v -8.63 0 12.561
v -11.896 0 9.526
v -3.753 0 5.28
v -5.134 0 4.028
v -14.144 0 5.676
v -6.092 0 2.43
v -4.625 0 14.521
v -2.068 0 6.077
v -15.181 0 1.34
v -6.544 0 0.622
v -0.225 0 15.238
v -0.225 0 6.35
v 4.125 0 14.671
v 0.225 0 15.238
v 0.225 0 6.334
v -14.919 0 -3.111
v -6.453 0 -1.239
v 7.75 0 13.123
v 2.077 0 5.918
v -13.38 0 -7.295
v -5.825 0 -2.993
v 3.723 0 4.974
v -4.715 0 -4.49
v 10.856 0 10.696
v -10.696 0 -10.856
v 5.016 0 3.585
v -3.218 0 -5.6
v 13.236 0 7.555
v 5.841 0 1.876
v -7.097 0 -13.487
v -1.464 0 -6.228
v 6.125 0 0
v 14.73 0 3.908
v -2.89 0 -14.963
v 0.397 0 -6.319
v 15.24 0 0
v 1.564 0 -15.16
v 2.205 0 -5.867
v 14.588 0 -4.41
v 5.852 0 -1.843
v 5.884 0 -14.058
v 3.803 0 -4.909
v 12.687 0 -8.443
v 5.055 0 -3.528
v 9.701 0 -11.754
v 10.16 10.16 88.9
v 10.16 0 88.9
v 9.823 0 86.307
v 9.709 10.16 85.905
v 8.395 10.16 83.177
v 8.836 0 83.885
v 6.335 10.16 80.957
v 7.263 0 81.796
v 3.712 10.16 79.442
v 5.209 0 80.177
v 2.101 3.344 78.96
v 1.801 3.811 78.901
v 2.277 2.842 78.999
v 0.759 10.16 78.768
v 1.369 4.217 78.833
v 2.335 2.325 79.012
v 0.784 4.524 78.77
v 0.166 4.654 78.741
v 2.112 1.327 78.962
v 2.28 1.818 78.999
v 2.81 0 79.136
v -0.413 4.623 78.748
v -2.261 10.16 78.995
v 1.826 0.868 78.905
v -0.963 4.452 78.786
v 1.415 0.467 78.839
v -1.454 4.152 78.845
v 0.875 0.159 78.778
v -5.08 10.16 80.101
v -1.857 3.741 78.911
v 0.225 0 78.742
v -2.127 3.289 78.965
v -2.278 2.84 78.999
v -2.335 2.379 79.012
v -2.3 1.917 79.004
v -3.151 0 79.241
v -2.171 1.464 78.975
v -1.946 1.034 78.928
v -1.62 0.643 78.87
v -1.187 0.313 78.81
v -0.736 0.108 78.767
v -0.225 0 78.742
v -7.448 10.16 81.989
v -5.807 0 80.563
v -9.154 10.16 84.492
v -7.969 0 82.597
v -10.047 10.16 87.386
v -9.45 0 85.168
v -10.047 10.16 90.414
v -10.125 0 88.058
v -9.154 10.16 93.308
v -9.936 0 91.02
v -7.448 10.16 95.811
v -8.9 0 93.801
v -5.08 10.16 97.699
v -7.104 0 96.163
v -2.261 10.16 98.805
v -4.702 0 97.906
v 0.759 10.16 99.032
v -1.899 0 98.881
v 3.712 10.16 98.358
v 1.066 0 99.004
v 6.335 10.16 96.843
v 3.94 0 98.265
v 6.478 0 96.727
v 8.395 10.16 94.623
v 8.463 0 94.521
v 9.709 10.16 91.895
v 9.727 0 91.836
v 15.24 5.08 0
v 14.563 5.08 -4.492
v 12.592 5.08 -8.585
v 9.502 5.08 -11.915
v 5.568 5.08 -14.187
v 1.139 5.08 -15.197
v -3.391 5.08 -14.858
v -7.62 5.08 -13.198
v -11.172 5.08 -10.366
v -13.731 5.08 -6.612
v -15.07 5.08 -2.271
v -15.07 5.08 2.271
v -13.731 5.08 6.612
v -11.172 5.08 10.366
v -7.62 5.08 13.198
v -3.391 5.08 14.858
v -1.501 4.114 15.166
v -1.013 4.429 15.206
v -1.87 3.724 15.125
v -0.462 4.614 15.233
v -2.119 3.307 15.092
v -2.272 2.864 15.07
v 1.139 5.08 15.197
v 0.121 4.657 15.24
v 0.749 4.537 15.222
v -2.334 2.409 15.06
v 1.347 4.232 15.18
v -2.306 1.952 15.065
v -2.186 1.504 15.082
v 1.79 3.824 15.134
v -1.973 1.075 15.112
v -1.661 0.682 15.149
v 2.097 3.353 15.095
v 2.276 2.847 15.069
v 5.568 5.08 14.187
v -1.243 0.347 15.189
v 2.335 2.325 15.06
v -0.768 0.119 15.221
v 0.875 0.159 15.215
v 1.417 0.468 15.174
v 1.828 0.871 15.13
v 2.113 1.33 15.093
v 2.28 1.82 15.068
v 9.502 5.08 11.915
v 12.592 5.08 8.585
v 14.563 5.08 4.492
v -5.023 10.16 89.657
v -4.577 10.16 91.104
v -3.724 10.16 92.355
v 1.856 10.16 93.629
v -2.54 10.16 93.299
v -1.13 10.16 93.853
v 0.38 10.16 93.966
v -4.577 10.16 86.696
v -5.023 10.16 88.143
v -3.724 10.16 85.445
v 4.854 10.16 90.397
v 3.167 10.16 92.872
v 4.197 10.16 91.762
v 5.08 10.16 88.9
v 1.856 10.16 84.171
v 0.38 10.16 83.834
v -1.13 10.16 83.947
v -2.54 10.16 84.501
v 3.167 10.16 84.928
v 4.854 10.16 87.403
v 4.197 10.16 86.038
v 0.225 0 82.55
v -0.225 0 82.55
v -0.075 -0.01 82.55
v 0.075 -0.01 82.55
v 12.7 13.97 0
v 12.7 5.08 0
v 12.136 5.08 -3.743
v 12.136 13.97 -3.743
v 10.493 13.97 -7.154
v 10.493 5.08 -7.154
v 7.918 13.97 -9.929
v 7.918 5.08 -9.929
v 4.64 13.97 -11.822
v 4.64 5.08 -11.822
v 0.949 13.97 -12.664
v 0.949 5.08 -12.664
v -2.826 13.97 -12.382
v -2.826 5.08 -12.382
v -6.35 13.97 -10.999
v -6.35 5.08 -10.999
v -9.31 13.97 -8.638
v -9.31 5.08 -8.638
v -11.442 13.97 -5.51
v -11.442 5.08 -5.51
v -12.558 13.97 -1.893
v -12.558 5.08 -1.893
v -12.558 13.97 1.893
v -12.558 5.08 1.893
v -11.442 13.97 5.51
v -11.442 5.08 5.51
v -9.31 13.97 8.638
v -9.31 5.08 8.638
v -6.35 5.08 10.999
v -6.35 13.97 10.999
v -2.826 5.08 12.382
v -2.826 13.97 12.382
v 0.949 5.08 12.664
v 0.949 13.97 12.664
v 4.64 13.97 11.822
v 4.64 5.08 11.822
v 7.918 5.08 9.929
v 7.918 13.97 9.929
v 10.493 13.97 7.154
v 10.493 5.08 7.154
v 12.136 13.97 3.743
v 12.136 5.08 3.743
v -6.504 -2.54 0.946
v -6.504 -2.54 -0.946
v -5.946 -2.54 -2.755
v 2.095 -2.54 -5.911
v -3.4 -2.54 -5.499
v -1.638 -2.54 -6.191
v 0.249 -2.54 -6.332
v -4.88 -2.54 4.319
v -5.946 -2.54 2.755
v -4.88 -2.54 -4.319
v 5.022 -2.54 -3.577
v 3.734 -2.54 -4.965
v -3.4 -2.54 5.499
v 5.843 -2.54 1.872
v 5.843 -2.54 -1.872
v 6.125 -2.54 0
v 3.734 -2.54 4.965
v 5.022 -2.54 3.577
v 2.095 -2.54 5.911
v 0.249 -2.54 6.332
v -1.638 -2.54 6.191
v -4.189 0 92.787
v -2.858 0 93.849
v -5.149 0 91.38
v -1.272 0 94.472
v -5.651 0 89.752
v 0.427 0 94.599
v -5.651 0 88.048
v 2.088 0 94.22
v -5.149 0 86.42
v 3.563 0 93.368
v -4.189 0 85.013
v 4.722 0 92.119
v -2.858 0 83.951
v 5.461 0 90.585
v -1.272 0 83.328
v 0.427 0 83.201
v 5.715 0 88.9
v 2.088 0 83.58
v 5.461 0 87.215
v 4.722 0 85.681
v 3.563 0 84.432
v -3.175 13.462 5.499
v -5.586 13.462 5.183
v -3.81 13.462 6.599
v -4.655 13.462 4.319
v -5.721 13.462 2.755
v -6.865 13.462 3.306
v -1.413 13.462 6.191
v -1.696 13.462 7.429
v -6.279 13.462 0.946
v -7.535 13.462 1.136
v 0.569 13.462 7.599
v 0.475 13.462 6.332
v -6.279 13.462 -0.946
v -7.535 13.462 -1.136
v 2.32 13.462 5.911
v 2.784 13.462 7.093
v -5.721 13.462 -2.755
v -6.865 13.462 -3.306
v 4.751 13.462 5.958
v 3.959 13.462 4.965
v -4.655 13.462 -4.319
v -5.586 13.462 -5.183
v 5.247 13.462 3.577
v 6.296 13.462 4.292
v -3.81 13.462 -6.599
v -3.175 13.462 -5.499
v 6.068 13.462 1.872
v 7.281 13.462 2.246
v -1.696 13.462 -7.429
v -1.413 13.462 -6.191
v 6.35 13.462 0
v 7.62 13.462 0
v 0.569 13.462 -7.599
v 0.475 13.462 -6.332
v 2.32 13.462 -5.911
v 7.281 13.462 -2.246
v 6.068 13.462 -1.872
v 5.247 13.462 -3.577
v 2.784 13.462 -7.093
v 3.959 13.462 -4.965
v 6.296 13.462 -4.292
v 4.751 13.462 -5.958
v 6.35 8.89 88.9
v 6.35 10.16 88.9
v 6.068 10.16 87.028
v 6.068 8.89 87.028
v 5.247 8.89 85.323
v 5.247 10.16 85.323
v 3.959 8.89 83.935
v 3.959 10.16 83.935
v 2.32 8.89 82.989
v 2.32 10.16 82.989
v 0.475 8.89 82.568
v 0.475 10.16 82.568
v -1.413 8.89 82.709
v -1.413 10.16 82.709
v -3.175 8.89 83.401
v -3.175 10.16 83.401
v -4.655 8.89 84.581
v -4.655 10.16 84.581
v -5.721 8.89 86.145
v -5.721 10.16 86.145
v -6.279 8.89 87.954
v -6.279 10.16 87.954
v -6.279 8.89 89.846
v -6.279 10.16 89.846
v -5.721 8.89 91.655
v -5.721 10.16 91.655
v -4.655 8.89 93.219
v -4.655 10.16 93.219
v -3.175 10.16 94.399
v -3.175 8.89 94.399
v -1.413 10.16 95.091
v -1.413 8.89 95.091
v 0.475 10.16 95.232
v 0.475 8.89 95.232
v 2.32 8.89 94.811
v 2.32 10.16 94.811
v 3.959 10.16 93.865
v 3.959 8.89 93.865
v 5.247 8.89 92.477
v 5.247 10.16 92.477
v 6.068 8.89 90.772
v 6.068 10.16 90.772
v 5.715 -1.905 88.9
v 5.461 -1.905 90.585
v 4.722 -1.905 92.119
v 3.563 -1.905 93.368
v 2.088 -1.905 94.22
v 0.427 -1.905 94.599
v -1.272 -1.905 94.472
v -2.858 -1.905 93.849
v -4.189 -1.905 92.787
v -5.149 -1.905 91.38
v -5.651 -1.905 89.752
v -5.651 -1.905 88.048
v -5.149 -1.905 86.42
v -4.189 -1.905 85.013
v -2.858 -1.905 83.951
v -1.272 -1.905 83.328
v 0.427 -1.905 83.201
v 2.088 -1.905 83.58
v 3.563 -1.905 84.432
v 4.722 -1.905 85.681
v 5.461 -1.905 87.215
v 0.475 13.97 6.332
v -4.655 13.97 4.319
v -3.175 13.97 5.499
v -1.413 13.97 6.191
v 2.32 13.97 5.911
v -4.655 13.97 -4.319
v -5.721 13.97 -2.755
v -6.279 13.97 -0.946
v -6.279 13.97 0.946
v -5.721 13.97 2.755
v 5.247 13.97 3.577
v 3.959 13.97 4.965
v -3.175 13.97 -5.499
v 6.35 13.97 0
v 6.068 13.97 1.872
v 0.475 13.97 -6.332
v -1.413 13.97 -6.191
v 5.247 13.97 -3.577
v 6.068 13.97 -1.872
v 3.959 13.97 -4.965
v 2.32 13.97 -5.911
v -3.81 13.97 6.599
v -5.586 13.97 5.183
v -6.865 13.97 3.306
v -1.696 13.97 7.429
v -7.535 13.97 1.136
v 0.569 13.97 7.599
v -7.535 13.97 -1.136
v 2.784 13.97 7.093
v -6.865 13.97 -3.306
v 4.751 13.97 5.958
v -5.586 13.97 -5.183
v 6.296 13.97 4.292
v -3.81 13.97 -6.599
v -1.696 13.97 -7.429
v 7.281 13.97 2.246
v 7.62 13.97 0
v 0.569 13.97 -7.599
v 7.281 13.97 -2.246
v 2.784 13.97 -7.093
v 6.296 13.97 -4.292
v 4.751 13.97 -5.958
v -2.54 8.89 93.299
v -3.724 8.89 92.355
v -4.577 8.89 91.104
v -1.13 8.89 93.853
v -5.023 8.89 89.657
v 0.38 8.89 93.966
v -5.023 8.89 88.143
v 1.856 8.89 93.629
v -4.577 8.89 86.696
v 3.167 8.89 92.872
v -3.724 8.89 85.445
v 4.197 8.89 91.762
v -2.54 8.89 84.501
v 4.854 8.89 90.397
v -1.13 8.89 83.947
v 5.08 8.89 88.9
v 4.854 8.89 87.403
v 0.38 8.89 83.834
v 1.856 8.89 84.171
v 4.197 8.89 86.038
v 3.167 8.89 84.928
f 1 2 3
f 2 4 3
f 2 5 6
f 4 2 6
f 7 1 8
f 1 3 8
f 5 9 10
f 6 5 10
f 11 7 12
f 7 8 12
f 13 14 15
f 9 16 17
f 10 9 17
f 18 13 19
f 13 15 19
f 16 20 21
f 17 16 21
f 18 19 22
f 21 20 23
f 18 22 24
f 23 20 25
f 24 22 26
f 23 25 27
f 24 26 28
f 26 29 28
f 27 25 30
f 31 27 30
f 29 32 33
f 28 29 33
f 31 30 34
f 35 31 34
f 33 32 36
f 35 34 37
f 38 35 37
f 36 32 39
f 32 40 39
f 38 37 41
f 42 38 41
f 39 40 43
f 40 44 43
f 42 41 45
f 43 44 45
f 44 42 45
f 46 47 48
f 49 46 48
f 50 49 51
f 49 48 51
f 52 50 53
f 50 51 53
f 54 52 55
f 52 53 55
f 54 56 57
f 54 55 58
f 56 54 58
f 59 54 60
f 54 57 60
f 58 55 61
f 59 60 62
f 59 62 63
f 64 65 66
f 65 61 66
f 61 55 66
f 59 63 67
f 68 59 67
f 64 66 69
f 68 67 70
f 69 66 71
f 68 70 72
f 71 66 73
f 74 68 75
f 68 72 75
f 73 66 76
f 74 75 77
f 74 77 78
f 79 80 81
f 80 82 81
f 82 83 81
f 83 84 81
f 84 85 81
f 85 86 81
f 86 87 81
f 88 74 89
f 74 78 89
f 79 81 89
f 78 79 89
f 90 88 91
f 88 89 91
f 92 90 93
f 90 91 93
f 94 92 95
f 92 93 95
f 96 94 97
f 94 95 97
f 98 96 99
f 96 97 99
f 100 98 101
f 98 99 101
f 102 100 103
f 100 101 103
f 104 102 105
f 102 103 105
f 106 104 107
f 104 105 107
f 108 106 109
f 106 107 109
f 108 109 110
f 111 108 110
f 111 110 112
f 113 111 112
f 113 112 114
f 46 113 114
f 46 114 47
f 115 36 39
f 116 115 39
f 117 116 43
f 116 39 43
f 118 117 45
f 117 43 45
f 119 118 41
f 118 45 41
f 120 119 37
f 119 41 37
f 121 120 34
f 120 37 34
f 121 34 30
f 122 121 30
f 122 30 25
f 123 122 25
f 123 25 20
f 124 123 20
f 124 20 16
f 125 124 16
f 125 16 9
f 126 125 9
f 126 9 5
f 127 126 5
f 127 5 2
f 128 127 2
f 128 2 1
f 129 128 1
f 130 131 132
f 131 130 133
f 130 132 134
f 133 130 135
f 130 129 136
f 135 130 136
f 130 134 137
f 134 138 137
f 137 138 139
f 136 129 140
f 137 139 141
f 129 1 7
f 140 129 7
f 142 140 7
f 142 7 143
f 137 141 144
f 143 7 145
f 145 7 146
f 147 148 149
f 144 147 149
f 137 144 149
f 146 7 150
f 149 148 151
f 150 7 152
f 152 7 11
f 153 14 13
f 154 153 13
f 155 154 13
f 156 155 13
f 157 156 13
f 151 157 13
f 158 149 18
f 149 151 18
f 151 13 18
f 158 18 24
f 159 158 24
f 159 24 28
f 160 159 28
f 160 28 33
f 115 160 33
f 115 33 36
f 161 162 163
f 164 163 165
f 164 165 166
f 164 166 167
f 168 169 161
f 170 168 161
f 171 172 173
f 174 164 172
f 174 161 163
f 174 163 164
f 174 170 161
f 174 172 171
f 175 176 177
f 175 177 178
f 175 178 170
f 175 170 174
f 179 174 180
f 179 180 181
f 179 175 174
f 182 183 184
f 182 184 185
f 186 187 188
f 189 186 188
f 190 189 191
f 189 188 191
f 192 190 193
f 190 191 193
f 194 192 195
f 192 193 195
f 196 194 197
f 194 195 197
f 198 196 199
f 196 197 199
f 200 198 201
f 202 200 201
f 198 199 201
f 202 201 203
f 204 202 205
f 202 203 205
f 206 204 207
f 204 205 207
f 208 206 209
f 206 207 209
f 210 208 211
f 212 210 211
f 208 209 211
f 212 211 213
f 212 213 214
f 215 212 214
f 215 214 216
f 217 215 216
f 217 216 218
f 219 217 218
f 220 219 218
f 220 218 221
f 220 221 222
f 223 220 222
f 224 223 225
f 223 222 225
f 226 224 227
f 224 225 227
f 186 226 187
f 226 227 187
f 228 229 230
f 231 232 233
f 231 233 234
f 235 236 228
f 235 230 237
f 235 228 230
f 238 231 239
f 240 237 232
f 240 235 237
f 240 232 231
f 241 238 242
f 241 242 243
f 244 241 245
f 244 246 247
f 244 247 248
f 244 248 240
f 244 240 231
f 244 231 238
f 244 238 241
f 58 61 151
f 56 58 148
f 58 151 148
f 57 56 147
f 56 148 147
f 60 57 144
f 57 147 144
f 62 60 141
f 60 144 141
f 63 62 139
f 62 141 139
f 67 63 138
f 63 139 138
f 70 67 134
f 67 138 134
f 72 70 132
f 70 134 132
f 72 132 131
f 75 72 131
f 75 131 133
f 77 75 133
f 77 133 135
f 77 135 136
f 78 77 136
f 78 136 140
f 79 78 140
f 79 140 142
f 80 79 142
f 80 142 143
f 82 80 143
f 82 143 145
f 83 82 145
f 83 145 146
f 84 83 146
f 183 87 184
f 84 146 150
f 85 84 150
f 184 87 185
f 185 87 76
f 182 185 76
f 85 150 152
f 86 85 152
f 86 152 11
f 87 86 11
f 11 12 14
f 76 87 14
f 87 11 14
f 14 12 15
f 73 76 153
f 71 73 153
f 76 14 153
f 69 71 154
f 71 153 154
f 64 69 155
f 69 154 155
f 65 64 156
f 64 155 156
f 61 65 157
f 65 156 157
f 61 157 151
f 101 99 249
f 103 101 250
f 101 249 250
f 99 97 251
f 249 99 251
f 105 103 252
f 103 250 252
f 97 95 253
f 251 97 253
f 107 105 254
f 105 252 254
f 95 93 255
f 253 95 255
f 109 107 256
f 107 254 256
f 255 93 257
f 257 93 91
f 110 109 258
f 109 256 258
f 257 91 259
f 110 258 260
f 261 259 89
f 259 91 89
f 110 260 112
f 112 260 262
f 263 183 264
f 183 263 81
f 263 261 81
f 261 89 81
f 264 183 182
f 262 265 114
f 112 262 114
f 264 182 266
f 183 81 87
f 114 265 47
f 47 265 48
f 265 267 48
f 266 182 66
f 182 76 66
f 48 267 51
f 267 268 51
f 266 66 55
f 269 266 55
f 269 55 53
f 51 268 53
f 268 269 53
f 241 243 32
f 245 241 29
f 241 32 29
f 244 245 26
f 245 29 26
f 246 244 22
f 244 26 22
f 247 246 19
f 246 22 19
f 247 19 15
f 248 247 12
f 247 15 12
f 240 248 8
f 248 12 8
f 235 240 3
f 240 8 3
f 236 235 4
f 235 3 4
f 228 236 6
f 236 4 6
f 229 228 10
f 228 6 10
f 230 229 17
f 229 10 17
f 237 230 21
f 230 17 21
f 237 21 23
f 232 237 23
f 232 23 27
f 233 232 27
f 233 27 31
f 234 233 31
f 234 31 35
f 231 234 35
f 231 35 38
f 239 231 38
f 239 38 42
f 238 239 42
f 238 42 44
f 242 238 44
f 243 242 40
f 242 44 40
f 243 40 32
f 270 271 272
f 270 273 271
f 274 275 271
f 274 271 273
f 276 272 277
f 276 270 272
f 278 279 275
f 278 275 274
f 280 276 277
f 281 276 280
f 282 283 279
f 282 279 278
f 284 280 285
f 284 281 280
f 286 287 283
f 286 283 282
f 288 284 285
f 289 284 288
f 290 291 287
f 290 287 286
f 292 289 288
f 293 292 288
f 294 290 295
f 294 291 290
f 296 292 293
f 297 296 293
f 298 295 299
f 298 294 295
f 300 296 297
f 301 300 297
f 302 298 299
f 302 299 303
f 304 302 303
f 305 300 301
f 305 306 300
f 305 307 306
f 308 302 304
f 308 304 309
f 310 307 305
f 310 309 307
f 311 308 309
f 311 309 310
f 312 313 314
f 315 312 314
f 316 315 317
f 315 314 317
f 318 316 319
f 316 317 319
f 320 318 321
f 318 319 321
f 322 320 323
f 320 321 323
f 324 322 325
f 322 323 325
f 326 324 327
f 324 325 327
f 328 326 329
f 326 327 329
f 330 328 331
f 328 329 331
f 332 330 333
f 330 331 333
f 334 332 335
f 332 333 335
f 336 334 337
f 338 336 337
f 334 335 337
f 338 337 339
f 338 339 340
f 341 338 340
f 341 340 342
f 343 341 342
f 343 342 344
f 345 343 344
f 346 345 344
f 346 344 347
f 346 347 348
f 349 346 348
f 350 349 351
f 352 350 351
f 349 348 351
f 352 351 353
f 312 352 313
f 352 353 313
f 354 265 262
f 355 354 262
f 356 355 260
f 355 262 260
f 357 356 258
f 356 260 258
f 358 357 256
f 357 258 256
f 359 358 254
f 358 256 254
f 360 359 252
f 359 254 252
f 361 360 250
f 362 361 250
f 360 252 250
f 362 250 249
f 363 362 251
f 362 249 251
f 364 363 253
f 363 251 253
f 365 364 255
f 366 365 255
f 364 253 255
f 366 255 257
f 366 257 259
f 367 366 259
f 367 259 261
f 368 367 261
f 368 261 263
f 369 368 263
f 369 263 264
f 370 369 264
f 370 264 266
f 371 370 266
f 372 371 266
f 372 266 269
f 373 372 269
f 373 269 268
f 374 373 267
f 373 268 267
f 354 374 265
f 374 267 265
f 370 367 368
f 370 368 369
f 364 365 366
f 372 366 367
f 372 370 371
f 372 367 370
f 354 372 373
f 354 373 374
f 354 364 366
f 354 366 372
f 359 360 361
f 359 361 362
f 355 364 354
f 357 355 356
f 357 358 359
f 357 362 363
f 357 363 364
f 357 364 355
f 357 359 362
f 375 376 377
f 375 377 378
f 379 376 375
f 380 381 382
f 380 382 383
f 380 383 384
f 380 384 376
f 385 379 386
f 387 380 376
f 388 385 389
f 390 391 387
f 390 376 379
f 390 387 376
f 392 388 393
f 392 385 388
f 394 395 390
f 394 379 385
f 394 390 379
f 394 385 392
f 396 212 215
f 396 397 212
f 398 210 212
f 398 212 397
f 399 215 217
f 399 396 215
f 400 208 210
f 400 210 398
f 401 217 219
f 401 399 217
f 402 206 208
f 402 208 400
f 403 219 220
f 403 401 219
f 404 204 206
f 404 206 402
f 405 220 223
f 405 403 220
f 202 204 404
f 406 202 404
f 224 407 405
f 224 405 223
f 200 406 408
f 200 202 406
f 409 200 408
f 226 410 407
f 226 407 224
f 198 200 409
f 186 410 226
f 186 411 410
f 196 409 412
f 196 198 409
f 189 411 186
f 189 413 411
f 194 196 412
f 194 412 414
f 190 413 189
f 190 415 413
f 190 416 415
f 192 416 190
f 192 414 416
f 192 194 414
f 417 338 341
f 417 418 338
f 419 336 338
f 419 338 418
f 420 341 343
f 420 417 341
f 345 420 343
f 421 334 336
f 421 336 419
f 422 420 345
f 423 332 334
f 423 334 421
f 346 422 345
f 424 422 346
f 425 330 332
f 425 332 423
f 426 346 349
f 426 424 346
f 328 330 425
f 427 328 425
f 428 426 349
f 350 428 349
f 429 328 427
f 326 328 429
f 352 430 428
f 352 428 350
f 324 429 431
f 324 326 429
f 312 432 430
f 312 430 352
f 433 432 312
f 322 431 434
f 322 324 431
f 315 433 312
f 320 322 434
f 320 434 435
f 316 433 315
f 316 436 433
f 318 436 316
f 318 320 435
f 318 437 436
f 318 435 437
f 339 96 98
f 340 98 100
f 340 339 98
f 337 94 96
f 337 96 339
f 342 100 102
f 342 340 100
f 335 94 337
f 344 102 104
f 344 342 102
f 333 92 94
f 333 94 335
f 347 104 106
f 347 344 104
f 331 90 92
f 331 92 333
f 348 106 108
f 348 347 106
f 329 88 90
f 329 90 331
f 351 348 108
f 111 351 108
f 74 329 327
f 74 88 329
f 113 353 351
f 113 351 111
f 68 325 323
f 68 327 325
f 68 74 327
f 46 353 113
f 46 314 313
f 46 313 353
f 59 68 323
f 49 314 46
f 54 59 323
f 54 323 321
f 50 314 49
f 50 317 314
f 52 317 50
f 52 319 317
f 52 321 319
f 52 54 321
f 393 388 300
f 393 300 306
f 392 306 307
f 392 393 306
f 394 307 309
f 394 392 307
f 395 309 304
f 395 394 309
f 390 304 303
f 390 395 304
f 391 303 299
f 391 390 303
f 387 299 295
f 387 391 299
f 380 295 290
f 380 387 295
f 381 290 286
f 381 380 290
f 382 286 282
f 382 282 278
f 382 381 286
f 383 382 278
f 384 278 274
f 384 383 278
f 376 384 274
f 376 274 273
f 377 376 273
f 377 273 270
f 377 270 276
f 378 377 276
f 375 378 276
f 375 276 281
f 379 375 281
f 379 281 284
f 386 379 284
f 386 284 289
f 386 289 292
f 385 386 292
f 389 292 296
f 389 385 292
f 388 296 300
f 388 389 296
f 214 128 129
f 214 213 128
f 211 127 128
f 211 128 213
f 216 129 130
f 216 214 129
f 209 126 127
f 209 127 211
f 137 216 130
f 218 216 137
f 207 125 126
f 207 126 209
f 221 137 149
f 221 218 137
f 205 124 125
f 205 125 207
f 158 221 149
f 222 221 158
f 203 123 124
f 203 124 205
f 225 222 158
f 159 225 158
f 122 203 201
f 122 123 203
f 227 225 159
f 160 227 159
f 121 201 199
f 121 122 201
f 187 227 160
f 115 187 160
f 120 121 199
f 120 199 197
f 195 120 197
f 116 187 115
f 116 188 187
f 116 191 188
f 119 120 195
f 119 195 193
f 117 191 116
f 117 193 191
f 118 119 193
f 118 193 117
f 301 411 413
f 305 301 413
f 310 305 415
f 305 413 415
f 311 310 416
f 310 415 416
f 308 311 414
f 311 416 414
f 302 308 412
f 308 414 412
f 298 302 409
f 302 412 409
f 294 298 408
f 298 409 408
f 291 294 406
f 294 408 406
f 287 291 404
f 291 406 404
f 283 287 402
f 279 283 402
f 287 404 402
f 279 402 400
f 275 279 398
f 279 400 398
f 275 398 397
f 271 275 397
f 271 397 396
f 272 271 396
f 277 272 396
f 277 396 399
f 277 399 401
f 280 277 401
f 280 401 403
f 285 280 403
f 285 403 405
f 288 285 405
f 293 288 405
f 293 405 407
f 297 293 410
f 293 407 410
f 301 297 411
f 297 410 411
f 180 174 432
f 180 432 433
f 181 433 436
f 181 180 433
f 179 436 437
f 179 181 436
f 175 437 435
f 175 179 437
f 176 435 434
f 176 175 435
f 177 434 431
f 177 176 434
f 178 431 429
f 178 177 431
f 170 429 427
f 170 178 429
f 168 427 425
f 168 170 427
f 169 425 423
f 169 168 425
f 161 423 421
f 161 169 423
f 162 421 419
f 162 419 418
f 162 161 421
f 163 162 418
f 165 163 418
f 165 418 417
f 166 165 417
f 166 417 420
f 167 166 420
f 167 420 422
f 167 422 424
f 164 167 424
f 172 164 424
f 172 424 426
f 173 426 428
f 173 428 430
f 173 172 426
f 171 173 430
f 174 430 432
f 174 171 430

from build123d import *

# Parameters (mm, degrees)
SKETCH2_R            = 15.24
BOSS_EXTRUDE1_DEPTH  = 5.08
SKETCH3_R            = 12.7
BOSS_EXTRUDE4_DEPTH  = 8.89
SKETCH4_R            = 7.62
SKETCH4_R_2          = 6.35
CUT_EXTRUDE2_DEPTH   = 0.508
SKETCH7_R            = 10.16
BOSS_EXTRUDE7_DEPTH  = 10.16
SKETCH8_R            = 6.35
SKETCH8_R_2          = 5.08
CUT_EXTRUDE6_DEPTH   = 1.27
SKETCH11_R           = 2.33542976
BOSS_EXTRUDE8_DEPTH  = 82.55
SKETCH12_R           = 6.35
BOSS_EXTRUDE9_DEPTH  = 2.54
SKETCH13_R           = 5.715
BOSS_EXTRUDE13_DEPTH = 1.905


with BuildPart() as part:
    # Sketch2 → Boss-Extrude1 (new body)
    with BuildSketch(Plane(origin=(0, 0, 0), x_dir=(1, 0, 0), z_dir=(0, 1, 0))):
        Circle(SKETCH2_R)
    extrude(amount=BOSS_EXTRUDE1_DEPTH)

    # Sketch3 → Boss-Extrude4 (add)
    with BuildSketch(Plane(origin=(0, 5.08, 0), x_dir=(1, 0, 0), z_dir=(0, 1, 0))):
        Circle(SKETCH3_R)
    extrude(amount=BOSS_EXTRUDE4_DEPTH)

    # Sketch4 → Cut-Extrude2 (cut)
    with BuildSketch(Plane(origin=(0, 13.97, 0), x_dir=(1, 0, 0), z_dir=(0, 1, 0))):
        Circle(SKETCH4_R)
        Circle(SKETCH4_R_2, mode=Mode.SUBTRACT)
    extrude(amount=-CUT_EXTRUDE2_DEPTH, mode=Mode.SUBTRACT)



with BuildPart() as body_2:
    # Sketch7 → Boss-Extrude7 (new body)
    with BuildSketch(Plane(origin=(0, 0, 0), x_dir=(1, 0, 0), z_dir=(0, 1, 0))):
        with Locations((0, -88.9)):
            Circle(SKETCH7_R)
    extrude(amount=BOSS_EXTRUDE7_DEPTH)

    # Sketch8 → Cut-Extrude6 (cut)
    with BuildSketch(Plane(origin=(0, 10.16, 0), x_dir=(1, 0, 0), z_dir=(0, 1, 0))):
        with Locations((0, -88.9)):
            Circle(SKETCH8_R)
        with Locations((0, -88.9)):
            Circle(SKETCH8_R_2, mode=Mode.SUBTRACT)
    extrude(amount=-CUT_EXTRUDE6_DEPTH, mode=Mode.SUBTRACT)


with BuildPart() as part_1:
    add(part.part)

    add(body_2.part)  # Boss-Extrude8 merges body 2
    # Sketch11 → Boss-Extrude8 (add)
    with BuildSketch(Plane.XY):
        with Locations((0, 2.324561436)):
            Circle(SKETCH11_R)
    extrude(amount=BOSS_EXTRUDE8_DEPTH)

    # Sketch12 → Boss-Extrude9 (add)
    with BuildSketch(Plane.XZ):
        with Locations((-0.225047318, 0)):
            Circle(SKETCH12_R)
    extrude(amount=BOSS_EXTRUDE9_DEPTH)

    # Sketch13 → Boss-Extrude13 (add)
    with BuildSketch(Plane.XZ):
        with Locations((0, 88.9)):
            Circle(SKETCH13_R)
    extrude(amount=BOSS_EXTRUDE13_DEPTH)


solid = part_1.part
